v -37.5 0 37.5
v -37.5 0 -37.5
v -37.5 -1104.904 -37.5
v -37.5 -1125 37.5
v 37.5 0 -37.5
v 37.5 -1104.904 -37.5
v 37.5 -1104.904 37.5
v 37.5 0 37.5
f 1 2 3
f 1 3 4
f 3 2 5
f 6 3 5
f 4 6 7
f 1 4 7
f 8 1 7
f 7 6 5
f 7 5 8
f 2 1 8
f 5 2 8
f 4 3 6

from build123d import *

# Parameters (mm, degrees)
F0_W     = 75
F0_H     = 75
F1_DEPTH = 1125
F2_SIZE2 = 20.096179
F2_SIZE  = 74.99999


# Not quite as in the source:
# - a fillet or chamfer is up to 0.001 mm smaller than in the source, because OpenCascade refuses the exact size


with BuildPart() as f1:
    # F0 (on Front) → F1 (new body)
    with BuildSketch(Plane.XZ):
        Rectangle(F0_W, F0_H)
    extrude(amount=F1_DEPTH)

    # F2 (size 75 and 20.0961894323 in the source; OpenCascade refuses exactly that, so slightly less here)
    f2_edges = [f1.edges().sort_by_distance(p)[0] for p in [
        (37.5, -1125, 0),
        (0, -1125, -37.5),
    ]]
    f2_side = f1.faces().sort_by_distance((0, -1125, 0))[0]
    chamfer(f2_edges, length=F2_SIZE, length2=F2_SIZE2, reference=f2_side)


solid = f1.part
